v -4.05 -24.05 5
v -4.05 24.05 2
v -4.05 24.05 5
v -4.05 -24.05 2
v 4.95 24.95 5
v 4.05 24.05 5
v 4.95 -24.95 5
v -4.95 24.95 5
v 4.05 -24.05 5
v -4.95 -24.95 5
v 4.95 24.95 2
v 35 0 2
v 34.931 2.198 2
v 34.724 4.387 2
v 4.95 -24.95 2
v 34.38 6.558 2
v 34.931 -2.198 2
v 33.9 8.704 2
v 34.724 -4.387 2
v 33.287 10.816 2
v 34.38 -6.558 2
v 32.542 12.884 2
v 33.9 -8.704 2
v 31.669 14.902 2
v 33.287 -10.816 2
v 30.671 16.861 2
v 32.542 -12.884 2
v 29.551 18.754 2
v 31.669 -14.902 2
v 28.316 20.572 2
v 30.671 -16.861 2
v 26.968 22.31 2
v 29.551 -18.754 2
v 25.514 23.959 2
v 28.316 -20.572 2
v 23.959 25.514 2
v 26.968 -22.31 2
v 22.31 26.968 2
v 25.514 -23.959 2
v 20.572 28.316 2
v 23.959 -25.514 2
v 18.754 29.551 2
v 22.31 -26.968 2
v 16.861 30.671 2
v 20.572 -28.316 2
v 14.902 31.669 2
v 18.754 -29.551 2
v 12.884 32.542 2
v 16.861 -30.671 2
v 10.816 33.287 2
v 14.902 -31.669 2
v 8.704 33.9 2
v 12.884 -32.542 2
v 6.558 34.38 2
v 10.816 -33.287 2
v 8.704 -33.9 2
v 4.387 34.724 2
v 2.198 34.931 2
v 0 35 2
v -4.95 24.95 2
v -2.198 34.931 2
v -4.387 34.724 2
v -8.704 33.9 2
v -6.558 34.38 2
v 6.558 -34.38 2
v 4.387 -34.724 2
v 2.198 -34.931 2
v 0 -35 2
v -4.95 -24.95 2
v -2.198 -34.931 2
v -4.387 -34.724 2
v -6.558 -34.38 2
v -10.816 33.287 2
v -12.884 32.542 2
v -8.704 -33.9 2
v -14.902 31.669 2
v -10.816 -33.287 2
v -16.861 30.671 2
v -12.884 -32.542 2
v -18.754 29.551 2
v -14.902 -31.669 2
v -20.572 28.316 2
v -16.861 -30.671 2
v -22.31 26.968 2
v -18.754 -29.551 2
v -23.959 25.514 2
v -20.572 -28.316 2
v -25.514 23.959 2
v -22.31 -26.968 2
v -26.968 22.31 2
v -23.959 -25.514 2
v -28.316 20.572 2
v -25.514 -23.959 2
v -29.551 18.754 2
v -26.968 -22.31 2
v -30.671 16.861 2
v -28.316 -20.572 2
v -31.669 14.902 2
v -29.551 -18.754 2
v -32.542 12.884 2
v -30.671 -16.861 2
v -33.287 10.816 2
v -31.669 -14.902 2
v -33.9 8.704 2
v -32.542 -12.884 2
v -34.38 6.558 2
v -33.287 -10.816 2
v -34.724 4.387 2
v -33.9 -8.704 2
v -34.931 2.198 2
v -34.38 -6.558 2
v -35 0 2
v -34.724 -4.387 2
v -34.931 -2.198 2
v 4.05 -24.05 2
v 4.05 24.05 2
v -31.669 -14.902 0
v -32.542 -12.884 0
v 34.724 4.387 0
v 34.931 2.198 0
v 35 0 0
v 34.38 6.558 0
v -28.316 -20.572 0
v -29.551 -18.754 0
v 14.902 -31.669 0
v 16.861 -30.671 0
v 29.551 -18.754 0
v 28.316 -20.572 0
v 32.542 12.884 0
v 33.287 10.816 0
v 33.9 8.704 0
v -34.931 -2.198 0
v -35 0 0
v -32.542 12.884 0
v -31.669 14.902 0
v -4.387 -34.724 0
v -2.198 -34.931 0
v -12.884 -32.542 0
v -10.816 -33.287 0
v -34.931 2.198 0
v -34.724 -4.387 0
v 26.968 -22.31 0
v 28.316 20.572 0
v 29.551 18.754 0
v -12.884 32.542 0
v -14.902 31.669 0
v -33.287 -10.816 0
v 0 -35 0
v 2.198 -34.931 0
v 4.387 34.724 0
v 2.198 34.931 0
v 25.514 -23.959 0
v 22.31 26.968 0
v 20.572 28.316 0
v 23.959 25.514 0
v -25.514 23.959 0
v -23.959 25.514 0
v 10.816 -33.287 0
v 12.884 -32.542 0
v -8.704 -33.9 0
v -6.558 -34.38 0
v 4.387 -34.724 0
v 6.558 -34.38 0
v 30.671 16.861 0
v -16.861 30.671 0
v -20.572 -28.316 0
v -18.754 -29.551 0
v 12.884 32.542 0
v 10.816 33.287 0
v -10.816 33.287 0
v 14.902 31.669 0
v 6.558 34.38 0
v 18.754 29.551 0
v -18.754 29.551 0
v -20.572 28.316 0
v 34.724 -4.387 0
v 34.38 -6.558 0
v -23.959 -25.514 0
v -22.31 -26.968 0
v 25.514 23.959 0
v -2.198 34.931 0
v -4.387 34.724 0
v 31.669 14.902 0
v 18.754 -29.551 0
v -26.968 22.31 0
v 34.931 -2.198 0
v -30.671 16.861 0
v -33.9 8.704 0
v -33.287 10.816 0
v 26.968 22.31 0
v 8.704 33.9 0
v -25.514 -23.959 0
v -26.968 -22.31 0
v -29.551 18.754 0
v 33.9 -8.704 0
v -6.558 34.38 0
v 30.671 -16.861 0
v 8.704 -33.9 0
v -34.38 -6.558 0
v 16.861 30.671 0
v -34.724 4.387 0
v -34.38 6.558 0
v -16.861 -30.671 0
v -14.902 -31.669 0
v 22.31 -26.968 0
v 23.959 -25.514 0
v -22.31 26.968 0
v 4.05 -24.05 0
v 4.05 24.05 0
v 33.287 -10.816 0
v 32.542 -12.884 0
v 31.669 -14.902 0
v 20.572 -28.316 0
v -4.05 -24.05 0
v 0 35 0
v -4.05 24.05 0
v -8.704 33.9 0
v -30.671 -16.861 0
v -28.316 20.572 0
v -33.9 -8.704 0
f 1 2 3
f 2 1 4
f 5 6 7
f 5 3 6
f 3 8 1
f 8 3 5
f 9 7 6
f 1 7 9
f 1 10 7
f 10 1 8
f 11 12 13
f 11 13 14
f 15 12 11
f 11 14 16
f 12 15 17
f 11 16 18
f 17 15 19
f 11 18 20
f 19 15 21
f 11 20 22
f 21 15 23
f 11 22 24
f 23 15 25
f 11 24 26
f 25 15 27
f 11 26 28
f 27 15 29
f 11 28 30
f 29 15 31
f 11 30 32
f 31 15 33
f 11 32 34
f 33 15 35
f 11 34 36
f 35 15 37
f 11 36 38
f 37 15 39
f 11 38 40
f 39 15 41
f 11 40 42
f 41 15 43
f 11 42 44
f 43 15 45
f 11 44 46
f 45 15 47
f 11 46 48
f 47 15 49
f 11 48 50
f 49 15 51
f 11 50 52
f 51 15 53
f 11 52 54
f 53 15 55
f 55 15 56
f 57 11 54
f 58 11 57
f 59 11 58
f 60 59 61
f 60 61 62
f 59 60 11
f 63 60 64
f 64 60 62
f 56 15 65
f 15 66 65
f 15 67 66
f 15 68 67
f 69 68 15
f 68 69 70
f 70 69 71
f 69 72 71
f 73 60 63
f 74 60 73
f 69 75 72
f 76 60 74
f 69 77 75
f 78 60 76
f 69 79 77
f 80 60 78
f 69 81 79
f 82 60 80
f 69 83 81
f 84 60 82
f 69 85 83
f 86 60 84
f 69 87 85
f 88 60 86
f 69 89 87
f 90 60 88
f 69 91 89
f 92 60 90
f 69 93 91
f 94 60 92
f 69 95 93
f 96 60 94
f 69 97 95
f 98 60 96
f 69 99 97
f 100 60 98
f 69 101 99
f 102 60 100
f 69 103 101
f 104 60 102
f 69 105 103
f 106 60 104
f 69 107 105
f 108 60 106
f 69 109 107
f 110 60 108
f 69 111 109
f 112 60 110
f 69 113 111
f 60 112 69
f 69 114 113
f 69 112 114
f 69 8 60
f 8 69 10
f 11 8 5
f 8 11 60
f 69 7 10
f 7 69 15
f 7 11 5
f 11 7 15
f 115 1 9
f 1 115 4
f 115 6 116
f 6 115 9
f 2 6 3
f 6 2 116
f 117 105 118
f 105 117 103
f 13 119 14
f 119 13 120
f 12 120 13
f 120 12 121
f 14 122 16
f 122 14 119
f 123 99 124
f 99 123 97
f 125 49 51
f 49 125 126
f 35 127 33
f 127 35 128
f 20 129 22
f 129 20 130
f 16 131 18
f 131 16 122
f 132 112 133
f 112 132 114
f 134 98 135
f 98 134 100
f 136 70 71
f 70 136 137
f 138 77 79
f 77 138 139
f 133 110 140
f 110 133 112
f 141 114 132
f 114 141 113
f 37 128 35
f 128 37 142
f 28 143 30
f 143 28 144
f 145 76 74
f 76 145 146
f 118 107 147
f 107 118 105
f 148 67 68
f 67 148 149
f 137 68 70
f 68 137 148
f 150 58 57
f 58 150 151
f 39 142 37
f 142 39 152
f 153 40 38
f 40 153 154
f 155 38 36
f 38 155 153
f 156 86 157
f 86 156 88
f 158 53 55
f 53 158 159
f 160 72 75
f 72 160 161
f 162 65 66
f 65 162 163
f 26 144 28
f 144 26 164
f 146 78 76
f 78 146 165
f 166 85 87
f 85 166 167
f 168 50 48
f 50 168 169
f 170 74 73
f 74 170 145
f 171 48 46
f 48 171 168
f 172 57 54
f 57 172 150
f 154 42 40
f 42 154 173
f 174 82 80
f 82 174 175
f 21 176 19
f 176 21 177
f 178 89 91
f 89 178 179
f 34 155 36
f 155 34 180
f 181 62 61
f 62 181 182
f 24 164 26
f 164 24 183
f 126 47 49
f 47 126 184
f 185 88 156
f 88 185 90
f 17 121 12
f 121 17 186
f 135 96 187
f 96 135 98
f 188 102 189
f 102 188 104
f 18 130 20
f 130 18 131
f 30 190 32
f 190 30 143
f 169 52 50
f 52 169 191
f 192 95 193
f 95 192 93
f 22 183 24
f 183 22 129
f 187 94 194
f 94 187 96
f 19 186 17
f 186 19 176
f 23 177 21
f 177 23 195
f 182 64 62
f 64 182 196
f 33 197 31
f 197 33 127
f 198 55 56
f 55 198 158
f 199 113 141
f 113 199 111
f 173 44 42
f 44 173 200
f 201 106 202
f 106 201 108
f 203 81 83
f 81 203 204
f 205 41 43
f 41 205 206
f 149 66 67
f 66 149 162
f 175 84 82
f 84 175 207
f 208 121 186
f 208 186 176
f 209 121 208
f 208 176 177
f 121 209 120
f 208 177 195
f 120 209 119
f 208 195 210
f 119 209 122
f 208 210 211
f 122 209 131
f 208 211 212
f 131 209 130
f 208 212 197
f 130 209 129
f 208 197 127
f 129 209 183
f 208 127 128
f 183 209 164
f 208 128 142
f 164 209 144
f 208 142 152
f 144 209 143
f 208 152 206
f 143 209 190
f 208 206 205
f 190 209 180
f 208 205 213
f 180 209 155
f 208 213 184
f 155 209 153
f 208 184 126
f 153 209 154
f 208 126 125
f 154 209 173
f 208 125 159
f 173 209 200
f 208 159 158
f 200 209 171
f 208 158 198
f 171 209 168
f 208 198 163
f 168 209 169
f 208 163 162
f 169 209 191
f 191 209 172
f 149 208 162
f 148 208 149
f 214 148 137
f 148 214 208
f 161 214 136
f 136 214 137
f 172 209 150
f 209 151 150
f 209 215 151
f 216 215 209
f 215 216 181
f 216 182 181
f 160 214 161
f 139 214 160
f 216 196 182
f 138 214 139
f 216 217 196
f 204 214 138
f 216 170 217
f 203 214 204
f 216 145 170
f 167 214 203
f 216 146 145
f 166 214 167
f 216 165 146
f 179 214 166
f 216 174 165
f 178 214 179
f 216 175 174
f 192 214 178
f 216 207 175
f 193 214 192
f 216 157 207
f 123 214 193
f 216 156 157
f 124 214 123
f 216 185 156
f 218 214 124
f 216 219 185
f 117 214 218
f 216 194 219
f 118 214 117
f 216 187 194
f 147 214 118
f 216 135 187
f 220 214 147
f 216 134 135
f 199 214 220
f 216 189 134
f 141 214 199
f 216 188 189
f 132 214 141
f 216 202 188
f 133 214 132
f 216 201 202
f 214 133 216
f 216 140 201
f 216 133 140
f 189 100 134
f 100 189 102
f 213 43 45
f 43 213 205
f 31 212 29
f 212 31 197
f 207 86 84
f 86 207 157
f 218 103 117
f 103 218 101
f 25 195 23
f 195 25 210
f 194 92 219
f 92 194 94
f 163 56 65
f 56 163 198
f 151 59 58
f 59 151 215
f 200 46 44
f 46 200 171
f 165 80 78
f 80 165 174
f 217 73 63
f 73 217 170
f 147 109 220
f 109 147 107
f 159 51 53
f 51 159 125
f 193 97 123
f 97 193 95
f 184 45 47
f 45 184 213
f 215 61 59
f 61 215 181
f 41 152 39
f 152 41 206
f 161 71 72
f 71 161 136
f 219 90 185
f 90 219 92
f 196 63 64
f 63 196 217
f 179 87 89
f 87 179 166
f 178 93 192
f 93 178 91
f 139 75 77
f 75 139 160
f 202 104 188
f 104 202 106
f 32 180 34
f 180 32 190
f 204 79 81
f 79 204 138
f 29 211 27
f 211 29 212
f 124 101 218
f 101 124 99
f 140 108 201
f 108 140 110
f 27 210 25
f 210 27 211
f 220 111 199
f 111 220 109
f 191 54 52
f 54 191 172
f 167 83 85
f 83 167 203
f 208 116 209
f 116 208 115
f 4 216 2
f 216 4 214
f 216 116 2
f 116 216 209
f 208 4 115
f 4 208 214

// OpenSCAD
translate([- 9.9 / 2, - 49.9 / 2, 2])
union(){
    cube([0.9, 49.9, 3]);
    cube([9.9, 0.9, 3]);
    translate([9, 0, 0])
    cube([0.9, 49.9, 3]);
    translate([0, 49, 0])
    cube([9.9, 0.9, 3]);
}
difference(){
    cylinder(h = 2, d = 70, $fn=100, center = false);
    translate([- 9.9 / 2 + 0.9, - 49.9 / 2 + 0.9, 0])
    cube([9.9 - 2 * 0.9, 49.9 - 2 * 0.9, 2], false);
}
